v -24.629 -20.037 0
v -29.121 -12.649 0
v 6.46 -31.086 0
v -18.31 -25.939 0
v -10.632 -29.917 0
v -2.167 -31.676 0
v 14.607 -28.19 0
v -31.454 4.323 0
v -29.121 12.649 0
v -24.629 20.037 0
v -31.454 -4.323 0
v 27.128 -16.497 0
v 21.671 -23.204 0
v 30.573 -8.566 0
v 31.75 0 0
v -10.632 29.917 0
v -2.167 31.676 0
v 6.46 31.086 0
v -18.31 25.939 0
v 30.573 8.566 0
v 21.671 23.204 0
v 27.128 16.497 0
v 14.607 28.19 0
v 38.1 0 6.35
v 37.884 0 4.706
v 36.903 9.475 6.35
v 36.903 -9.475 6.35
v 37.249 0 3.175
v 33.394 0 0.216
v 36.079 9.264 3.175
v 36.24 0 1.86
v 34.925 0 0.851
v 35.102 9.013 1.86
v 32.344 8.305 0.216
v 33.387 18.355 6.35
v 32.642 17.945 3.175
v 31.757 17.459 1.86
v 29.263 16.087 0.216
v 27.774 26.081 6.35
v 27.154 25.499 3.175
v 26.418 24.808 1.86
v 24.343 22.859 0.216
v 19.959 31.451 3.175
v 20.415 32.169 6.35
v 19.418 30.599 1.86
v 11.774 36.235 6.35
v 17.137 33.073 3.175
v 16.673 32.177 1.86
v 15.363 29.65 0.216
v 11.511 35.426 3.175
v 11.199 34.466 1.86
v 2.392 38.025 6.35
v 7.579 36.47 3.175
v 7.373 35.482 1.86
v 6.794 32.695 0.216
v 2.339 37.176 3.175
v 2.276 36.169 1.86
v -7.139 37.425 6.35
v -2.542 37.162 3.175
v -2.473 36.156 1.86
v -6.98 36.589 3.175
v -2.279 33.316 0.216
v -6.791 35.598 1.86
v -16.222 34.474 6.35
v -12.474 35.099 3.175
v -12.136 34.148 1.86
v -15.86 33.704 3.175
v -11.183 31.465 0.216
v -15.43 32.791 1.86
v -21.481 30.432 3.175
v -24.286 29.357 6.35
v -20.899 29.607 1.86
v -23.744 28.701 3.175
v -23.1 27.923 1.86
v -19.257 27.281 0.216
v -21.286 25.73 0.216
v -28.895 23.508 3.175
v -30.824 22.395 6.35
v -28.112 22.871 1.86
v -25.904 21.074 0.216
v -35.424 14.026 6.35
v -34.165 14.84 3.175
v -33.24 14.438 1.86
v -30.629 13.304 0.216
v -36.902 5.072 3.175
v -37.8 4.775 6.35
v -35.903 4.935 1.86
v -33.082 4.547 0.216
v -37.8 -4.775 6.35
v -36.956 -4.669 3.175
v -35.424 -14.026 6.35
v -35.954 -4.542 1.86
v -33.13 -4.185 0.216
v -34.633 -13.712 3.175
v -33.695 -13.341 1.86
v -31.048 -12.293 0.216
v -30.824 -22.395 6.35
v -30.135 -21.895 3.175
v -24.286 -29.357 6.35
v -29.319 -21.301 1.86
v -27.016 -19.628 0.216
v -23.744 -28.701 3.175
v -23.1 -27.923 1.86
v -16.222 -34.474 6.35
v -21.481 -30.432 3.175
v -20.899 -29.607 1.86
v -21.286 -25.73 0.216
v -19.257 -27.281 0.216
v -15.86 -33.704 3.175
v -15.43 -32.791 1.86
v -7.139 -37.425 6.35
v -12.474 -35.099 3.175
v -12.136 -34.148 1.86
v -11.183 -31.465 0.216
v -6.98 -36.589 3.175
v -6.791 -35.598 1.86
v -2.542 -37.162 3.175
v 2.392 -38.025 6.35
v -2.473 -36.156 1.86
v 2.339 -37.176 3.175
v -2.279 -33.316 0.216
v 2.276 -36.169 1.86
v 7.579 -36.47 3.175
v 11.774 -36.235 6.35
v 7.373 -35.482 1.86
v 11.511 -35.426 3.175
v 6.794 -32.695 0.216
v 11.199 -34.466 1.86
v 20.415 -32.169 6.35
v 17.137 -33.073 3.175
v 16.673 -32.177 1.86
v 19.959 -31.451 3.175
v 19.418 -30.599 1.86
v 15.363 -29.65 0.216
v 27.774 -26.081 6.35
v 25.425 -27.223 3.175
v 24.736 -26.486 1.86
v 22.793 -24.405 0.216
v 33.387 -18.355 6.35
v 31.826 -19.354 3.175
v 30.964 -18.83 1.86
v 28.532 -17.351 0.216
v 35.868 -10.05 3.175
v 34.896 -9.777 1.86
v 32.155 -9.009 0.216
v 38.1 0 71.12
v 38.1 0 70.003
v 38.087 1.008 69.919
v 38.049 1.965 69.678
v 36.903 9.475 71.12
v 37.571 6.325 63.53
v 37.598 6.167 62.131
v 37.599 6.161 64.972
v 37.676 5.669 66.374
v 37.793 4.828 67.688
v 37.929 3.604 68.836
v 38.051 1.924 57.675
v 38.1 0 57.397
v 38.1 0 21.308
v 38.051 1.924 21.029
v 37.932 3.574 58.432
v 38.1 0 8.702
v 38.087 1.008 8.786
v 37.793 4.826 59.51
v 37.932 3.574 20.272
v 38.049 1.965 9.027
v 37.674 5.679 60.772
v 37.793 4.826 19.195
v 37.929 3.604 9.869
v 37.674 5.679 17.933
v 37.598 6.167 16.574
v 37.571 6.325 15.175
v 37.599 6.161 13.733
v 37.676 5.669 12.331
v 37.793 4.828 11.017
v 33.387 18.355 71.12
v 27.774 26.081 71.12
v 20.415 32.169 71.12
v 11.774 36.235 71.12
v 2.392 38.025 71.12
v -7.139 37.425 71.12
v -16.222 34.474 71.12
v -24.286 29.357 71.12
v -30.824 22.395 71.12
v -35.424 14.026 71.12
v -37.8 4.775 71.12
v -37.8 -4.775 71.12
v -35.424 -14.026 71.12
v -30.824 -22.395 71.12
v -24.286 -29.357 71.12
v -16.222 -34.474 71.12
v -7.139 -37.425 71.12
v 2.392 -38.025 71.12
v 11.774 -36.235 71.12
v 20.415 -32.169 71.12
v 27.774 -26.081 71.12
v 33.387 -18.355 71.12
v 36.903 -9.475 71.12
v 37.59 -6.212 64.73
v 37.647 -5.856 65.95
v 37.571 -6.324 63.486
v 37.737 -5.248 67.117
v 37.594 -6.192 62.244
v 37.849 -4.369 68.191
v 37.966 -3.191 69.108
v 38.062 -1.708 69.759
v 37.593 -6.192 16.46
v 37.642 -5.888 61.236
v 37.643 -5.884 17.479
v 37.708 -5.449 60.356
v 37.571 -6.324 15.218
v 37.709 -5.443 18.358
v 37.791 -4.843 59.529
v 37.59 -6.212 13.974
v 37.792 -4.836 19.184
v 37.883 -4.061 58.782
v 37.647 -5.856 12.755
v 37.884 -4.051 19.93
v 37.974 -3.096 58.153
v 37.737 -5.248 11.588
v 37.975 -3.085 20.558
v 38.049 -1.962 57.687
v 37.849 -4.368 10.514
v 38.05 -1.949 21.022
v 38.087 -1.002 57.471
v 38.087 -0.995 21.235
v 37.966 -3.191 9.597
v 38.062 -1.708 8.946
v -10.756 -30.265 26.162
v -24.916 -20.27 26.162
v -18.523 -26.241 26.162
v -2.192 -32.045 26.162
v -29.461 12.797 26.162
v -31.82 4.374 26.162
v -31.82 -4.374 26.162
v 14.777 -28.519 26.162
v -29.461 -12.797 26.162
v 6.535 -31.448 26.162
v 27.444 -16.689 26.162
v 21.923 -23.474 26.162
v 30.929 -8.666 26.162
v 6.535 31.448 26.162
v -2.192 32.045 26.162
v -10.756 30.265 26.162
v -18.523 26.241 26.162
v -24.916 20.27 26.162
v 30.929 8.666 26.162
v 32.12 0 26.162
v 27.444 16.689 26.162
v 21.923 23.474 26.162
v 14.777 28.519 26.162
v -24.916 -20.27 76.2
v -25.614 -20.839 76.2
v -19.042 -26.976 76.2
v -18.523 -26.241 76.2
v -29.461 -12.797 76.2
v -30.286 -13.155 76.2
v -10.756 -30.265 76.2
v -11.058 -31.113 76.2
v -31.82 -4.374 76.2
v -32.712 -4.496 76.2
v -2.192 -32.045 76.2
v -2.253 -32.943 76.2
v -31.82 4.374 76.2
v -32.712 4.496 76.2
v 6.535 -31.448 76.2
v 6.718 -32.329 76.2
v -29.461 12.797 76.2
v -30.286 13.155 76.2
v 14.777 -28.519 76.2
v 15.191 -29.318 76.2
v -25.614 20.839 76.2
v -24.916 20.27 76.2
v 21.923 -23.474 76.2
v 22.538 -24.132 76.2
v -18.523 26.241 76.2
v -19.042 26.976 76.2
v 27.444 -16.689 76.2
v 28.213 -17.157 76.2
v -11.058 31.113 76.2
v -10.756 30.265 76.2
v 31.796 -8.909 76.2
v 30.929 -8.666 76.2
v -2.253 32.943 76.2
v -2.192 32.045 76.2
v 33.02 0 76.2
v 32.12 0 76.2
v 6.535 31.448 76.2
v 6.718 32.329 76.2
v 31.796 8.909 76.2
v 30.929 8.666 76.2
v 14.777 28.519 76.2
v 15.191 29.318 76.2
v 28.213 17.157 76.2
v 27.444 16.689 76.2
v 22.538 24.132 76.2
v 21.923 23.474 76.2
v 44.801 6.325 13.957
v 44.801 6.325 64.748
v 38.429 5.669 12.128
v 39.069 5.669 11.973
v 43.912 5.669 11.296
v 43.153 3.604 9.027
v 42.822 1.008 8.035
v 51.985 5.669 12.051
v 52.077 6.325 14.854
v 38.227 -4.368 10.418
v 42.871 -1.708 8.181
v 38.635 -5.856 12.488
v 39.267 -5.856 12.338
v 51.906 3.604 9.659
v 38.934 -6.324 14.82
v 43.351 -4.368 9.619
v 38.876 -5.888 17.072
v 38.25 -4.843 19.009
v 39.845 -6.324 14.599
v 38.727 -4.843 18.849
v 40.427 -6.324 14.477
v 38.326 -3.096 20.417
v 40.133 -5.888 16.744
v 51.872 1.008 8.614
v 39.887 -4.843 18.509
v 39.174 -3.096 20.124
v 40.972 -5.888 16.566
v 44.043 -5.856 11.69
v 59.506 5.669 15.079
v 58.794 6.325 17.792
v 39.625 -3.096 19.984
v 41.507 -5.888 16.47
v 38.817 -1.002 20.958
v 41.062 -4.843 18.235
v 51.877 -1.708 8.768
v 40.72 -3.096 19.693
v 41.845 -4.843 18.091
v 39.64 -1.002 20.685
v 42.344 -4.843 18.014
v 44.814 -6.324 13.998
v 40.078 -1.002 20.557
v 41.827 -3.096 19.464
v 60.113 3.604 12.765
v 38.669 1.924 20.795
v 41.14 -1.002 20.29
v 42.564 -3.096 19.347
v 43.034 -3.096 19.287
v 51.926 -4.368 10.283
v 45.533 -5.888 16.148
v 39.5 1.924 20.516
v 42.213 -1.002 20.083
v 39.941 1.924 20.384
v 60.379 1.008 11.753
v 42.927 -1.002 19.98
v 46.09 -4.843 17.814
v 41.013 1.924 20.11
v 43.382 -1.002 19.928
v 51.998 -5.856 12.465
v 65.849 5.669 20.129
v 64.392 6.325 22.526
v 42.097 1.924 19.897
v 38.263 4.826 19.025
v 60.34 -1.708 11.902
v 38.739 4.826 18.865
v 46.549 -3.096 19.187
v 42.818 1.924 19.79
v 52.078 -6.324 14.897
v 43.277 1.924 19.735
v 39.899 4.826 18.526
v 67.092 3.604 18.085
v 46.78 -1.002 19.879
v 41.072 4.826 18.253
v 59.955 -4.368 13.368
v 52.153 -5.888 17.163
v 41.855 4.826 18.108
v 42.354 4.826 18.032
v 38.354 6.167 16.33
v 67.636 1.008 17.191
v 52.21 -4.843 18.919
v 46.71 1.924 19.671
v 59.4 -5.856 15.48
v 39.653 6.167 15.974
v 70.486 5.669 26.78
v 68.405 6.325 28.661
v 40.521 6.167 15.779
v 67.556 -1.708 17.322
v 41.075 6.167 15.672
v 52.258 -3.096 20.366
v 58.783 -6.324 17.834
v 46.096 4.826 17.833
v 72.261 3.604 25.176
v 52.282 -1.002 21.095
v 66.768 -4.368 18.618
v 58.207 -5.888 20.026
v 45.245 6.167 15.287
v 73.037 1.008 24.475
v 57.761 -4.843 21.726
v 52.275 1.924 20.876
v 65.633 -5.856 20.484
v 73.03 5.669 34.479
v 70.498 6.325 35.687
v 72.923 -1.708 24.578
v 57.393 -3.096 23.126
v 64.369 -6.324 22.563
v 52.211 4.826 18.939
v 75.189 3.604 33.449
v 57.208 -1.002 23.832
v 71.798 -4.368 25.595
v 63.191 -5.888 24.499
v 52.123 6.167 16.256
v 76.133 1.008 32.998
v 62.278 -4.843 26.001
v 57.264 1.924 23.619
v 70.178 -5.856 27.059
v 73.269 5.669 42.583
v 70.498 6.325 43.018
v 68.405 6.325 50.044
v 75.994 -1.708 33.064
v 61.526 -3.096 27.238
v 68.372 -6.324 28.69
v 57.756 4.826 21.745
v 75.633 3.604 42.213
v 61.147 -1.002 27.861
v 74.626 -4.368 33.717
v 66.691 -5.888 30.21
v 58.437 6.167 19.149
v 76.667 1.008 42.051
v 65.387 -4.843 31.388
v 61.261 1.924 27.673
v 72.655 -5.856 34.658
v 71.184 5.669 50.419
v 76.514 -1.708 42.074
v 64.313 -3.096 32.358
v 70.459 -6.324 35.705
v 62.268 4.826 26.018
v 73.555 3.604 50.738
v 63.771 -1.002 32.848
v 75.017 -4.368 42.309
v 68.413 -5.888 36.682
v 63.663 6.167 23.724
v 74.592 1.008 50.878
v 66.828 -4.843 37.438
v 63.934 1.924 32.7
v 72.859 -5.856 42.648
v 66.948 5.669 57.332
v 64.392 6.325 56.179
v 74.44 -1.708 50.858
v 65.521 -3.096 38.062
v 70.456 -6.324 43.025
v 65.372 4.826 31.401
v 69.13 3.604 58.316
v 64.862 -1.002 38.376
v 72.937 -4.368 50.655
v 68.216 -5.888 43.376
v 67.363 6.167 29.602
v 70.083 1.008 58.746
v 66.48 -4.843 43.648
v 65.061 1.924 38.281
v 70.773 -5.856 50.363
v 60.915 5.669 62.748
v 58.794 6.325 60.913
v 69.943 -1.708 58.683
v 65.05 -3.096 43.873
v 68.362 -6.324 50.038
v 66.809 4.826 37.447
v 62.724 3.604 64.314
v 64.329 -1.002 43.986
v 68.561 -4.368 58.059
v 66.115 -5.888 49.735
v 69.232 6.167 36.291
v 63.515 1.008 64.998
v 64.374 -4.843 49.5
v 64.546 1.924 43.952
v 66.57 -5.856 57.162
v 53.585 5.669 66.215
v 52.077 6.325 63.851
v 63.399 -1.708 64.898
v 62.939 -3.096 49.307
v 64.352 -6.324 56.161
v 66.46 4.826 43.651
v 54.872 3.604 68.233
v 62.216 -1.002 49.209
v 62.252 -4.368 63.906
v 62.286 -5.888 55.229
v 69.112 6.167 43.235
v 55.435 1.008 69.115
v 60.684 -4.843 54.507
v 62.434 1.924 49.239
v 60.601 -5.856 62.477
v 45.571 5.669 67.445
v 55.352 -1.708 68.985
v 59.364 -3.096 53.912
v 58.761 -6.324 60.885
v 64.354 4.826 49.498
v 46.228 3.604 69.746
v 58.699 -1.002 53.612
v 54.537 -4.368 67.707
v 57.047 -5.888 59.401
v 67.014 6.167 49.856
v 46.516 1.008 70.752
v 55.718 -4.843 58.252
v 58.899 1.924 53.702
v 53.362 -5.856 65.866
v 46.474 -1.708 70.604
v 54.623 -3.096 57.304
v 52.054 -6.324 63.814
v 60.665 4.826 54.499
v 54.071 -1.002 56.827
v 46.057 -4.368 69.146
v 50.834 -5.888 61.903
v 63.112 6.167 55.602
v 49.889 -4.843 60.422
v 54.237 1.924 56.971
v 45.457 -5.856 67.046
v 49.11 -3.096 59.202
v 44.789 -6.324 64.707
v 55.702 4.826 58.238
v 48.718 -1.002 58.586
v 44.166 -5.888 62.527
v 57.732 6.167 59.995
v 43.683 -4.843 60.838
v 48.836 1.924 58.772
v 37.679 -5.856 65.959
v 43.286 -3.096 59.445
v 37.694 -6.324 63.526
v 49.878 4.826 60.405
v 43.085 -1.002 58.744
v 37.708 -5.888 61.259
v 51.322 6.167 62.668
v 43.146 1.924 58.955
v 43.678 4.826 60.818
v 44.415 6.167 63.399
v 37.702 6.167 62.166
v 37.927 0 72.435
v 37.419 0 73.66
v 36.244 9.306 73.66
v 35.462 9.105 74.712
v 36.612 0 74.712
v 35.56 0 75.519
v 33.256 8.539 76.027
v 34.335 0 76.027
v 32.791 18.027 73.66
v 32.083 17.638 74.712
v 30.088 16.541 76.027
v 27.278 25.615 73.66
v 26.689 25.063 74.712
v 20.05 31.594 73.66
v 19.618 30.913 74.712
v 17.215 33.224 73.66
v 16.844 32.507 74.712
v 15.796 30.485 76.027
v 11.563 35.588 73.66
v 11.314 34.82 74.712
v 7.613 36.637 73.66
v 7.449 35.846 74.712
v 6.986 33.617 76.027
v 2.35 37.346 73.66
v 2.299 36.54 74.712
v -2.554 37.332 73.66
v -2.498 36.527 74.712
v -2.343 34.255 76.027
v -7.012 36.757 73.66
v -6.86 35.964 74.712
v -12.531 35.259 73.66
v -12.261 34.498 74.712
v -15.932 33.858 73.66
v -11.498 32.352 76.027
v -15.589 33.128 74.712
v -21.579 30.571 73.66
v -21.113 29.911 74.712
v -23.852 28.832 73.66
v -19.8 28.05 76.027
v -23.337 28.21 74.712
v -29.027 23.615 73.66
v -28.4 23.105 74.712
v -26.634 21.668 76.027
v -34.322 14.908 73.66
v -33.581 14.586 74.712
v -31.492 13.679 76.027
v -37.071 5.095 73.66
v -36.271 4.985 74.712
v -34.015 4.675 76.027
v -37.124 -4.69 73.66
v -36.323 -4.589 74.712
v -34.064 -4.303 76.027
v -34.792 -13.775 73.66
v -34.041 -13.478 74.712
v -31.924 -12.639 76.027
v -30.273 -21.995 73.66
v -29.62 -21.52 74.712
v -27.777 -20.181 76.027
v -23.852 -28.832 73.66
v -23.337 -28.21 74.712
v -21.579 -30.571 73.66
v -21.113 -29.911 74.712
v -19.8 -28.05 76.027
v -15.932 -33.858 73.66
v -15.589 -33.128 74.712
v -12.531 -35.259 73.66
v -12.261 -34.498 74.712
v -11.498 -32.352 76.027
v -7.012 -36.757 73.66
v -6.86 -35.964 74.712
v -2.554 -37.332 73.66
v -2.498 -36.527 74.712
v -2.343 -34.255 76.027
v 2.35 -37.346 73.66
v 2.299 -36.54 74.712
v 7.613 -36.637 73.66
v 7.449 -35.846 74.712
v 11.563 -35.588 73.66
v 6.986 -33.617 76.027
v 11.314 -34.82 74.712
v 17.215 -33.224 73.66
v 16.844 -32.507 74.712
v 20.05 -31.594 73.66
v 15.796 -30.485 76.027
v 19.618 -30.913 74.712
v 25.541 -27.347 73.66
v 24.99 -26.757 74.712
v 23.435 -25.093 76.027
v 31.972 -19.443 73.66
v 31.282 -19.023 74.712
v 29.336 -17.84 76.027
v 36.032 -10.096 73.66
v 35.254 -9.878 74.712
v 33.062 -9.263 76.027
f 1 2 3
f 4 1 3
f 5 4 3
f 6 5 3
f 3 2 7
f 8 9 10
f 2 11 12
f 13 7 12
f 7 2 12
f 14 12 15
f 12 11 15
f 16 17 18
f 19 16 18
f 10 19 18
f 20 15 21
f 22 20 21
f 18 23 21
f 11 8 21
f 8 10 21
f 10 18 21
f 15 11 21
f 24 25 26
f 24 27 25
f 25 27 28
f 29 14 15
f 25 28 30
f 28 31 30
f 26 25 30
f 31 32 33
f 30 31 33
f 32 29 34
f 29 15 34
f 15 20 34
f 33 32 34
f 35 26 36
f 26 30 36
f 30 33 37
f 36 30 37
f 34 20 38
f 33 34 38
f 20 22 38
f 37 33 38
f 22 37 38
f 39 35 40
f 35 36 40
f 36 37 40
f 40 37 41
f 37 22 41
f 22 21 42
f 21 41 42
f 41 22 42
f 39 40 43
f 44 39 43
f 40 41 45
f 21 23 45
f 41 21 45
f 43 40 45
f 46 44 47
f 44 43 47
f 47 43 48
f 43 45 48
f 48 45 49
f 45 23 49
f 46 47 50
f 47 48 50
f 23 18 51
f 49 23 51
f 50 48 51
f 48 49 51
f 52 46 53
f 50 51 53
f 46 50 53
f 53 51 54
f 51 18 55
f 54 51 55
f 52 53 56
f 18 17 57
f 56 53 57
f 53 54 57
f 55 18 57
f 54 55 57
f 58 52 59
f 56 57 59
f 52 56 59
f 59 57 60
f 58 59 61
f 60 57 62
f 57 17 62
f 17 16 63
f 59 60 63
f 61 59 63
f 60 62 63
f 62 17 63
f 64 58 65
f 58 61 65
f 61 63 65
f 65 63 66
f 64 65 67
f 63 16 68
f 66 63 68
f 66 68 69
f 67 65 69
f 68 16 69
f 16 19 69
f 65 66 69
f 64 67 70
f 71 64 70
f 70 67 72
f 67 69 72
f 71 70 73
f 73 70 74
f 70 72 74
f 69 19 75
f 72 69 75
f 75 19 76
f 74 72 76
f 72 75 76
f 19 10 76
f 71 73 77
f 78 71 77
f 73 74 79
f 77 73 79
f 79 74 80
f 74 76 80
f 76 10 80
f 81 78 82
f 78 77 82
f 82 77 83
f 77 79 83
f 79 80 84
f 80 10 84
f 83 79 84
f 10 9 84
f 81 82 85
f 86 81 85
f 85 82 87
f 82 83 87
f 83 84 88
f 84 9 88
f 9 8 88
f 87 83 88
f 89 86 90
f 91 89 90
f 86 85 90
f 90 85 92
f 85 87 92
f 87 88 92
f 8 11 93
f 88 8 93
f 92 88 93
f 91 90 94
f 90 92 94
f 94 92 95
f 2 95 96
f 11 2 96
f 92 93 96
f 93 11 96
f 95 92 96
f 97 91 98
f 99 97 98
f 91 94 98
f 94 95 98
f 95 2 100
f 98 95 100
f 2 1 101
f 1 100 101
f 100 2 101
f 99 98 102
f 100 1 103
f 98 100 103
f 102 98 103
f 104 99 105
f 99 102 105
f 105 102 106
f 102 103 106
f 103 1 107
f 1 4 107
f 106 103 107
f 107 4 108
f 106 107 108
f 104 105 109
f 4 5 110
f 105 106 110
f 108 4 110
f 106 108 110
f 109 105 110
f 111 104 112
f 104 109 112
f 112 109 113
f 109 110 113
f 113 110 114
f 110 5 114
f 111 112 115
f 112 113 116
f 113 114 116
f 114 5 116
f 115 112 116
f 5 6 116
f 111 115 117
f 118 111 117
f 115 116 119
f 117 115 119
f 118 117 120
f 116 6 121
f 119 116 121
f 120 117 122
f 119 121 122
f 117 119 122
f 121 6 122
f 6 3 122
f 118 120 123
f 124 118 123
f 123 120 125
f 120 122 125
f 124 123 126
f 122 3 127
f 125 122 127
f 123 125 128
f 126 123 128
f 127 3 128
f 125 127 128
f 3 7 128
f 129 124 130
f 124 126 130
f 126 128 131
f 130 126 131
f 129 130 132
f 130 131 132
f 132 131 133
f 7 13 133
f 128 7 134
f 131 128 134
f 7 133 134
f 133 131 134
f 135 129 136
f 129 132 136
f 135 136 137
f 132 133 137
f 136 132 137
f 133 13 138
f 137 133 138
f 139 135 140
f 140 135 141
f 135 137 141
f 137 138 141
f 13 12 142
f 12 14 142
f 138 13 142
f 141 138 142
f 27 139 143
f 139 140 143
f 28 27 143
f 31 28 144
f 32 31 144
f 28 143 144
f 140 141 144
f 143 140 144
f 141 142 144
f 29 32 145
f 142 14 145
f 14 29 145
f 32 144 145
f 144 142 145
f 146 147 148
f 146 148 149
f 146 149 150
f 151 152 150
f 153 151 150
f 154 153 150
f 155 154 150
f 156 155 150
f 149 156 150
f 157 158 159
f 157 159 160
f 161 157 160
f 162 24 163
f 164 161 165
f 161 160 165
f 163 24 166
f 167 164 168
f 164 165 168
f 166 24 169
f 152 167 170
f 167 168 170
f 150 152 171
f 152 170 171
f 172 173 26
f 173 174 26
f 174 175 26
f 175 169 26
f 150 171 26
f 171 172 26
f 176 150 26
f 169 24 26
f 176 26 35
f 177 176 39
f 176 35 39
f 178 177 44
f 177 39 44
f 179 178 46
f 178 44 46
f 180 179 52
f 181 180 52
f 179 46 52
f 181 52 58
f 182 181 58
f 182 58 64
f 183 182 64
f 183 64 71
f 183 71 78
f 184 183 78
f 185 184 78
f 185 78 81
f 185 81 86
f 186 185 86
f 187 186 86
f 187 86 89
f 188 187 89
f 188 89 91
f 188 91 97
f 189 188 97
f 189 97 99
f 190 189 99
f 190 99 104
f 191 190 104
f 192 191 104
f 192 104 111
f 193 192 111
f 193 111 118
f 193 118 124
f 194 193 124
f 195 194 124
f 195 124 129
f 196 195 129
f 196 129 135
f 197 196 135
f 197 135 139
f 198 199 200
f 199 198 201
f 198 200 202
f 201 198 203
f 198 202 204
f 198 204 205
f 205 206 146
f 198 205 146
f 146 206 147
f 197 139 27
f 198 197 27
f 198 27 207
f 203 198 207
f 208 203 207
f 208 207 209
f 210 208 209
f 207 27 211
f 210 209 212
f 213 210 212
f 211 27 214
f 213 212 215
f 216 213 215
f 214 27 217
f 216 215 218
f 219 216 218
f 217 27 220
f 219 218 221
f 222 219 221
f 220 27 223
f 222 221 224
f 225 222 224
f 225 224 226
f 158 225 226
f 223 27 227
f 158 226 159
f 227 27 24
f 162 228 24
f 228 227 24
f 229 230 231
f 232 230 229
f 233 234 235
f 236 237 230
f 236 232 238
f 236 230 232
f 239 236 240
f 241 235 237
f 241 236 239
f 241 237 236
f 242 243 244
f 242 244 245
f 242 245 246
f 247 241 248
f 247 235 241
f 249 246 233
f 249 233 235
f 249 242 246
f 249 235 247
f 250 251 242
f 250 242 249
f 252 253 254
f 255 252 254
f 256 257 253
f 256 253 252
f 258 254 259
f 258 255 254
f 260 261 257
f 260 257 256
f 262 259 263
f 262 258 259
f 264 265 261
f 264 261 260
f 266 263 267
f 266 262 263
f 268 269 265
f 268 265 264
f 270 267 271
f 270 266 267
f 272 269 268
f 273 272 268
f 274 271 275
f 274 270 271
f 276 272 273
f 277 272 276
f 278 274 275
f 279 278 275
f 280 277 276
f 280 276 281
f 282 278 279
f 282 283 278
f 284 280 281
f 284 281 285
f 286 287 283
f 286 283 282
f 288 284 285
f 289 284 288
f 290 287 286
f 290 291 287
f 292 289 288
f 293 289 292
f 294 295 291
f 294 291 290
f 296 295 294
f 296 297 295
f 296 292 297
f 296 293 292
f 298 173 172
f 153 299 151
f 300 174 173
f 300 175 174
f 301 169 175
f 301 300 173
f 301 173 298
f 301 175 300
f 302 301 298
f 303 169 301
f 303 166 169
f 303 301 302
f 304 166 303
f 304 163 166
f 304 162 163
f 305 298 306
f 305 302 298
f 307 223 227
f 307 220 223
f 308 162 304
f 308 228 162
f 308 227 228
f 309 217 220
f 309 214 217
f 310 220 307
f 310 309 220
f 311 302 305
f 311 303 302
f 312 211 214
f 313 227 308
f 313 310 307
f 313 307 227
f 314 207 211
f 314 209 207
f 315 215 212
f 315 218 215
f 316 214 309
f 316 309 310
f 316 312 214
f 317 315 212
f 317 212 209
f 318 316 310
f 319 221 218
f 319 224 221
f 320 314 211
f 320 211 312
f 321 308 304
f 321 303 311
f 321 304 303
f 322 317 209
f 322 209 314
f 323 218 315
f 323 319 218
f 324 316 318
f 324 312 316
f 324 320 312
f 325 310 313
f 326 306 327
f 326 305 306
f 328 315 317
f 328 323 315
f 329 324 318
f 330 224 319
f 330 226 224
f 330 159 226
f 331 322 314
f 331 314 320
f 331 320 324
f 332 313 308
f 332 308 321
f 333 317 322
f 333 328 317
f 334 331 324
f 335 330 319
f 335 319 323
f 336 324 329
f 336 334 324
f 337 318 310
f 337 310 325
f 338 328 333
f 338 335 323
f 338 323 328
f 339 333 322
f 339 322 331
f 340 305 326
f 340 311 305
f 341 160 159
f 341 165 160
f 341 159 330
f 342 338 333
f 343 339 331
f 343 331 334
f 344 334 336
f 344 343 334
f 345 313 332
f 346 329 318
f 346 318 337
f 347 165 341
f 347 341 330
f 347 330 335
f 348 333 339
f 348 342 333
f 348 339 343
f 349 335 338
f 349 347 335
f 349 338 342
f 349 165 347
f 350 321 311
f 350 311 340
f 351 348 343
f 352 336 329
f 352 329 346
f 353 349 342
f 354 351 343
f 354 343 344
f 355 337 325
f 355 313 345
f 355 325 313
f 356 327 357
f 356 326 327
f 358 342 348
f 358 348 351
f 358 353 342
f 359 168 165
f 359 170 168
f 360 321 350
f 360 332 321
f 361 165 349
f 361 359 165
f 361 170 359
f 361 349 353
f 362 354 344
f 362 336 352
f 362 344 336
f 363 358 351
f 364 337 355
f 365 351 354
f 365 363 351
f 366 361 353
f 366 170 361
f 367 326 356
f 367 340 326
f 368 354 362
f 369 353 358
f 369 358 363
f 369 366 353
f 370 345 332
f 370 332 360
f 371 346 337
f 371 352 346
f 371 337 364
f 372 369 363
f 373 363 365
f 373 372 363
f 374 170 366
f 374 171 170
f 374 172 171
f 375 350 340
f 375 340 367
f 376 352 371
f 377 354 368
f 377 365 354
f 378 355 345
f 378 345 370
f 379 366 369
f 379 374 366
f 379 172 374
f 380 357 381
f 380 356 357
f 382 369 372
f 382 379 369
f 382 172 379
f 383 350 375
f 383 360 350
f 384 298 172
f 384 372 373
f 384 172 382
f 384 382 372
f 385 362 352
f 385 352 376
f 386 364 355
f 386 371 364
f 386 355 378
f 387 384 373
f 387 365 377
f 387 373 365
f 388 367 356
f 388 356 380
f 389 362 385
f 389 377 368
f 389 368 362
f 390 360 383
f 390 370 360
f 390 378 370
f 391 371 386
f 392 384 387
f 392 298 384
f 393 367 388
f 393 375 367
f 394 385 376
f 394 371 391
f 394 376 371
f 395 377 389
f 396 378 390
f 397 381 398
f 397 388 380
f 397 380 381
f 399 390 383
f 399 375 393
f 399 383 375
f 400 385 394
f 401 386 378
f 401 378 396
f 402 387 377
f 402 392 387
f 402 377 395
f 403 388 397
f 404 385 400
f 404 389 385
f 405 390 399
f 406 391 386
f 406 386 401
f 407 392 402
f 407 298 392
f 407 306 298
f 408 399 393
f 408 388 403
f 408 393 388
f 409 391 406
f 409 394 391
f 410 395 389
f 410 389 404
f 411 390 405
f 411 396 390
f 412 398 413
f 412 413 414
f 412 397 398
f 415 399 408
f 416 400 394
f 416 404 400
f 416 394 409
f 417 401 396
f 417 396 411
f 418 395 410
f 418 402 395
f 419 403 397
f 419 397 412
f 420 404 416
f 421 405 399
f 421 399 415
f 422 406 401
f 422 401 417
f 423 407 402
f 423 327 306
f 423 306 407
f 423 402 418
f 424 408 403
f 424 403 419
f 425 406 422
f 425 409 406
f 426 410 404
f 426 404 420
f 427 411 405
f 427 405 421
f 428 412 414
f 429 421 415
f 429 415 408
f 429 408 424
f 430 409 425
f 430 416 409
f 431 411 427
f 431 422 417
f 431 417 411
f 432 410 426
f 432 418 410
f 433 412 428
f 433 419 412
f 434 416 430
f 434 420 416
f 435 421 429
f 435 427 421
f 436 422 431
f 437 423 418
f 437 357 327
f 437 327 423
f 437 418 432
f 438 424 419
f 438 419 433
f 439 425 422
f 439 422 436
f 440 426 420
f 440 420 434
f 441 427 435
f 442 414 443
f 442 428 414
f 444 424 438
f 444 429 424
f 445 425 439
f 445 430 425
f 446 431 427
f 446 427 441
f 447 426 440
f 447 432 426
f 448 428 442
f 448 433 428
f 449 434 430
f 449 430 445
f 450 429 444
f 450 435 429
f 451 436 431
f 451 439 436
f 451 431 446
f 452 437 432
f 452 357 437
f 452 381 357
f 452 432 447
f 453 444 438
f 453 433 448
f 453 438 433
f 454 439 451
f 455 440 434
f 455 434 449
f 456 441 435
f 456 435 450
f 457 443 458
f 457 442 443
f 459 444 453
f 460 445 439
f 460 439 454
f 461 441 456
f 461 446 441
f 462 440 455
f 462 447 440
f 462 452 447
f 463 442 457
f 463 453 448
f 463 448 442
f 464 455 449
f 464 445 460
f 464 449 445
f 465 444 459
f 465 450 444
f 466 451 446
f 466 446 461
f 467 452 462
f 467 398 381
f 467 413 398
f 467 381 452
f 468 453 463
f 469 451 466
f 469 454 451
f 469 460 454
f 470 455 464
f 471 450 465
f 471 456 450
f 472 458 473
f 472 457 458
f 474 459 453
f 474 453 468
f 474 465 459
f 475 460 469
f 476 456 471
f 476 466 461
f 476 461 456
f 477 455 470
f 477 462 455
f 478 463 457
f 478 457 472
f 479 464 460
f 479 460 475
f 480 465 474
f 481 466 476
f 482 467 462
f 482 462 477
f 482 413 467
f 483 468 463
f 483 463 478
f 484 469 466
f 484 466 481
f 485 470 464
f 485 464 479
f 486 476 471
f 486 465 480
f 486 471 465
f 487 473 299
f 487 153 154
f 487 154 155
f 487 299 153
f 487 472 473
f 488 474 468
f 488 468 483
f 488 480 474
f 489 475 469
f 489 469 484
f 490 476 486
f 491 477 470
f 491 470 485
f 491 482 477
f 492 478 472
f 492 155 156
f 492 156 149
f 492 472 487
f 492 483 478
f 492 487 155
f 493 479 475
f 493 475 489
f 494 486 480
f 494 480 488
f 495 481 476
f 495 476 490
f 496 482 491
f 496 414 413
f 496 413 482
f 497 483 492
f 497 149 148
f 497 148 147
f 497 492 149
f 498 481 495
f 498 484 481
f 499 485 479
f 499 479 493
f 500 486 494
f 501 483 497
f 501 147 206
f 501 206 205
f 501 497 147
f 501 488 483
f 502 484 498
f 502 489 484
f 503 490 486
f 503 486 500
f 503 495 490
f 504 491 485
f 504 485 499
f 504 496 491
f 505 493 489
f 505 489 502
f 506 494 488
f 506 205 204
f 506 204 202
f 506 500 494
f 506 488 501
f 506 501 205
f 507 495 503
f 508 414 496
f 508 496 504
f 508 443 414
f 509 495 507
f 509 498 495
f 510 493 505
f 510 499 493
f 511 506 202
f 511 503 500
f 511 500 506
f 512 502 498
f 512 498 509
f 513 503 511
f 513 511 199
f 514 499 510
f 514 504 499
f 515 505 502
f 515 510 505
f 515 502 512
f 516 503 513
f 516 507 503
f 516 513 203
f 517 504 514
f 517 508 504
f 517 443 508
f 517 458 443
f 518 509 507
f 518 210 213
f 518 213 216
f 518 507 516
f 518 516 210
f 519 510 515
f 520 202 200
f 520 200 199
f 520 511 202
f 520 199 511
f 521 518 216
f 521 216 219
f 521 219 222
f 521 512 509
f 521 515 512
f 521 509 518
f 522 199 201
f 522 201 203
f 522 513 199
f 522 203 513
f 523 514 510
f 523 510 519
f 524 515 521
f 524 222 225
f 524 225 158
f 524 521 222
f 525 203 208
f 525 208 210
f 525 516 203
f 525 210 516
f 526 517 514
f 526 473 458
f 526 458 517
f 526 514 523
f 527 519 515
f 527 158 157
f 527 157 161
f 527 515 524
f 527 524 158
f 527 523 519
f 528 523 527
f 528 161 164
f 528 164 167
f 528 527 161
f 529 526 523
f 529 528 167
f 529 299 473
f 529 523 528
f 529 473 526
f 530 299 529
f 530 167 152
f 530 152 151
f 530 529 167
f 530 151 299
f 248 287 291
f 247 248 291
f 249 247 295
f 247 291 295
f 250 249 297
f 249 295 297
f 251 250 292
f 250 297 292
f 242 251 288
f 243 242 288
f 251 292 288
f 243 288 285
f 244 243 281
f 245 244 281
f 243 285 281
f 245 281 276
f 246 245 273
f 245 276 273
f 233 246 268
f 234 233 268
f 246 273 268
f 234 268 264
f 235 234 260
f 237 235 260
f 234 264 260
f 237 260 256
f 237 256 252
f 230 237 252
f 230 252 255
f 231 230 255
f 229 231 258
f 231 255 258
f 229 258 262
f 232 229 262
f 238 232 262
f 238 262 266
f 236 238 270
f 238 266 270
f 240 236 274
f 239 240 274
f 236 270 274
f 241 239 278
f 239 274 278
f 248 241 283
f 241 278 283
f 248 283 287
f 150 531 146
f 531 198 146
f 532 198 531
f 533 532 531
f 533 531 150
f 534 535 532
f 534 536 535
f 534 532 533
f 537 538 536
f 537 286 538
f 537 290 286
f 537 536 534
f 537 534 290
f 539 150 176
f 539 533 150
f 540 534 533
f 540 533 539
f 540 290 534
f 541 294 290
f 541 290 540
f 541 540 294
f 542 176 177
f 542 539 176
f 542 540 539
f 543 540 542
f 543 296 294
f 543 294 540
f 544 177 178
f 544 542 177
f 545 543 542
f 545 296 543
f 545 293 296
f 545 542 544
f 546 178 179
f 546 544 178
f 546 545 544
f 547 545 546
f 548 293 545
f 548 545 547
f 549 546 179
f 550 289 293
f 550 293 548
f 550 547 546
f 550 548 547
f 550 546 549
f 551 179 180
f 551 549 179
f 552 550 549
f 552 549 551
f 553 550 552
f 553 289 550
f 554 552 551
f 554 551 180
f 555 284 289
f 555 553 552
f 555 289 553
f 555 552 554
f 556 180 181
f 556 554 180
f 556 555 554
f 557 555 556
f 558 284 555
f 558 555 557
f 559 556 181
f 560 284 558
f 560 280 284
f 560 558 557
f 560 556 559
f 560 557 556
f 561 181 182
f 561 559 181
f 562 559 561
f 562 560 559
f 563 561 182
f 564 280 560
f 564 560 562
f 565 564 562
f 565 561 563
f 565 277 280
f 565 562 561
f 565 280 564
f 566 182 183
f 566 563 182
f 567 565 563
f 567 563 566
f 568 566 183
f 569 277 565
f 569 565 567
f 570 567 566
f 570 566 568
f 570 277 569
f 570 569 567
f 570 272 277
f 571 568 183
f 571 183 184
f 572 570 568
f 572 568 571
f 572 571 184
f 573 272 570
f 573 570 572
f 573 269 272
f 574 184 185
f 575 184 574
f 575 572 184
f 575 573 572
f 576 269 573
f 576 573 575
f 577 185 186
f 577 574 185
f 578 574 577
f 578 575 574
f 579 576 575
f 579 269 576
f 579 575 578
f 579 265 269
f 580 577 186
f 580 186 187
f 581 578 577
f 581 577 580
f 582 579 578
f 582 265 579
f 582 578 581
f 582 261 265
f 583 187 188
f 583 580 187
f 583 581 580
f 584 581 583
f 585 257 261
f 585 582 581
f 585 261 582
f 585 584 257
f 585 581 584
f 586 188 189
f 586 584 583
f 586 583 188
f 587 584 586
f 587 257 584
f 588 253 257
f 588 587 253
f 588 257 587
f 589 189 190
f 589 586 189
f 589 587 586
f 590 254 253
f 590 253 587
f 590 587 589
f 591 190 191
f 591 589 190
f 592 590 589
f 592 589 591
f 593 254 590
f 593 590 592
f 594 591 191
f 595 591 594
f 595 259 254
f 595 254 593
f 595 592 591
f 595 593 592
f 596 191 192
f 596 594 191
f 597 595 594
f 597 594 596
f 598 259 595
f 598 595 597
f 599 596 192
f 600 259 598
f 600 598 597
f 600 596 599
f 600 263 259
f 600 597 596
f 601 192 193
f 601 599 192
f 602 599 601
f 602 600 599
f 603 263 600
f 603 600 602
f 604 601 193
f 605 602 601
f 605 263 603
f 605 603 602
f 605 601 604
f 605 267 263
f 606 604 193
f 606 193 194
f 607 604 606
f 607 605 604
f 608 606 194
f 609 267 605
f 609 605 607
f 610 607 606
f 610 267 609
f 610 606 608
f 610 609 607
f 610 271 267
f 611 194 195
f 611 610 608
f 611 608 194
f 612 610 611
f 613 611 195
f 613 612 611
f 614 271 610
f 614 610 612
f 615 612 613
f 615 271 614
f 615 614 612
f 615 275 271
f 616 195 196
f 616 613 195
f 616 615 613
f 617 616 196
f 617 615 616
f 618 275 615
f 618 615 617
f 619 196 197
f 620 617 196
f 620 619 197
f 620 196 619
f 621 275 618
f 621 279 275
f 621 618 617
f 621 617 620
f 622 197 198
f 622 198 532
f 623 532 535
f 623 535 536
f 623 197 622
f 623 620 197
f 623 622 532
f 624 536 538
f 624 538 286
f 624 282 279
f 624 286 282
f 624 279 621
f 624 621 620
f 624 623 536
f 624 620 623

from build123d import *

# Parameters (mm, degrees)
F0_R     = 38.1
F1_DEPTH = 76.2
F4_R     = 6.3246
F6_R     = 32.1196500774
F7_DEPTH = 50.038
F8_R     = 5.08
F9_R     = 6.35


with BuildPart() as f1:
    # F0 (on Top) → F1 (new body)
    with BuildSketch(Plane.XY):
        Circle(F0_R)
    extrude(amount=F1_DEPTH)

    # F5: sweep along a path in F2
    with BuildLine(Plane.XZ) as f5_path:
        ThreePointArc((33.5242934525, 16.8796218932), (70.7589105159, 39.7583444109), (32.8120825502, 61.4353114321))
    # F4 (on offset) → F5 (sweep)
    with BuildSketch(Plane.YZ.offset(37.846)):
        with Locations((0, 63.6169761419)):
            Circle(F4_R)
    sweep(path=f5_path.line)

    # F6 (on face) → F7 (cut)
    with BuildSketch(Plane.XY.offset(76.2)):
        Circle(F6_R)
    extrude(amount=-F7_DEPTH, mode=Mode.SUBTRACT)

    # F8
    f8_edges = [f1.edges().sort_by_distance(p)[0] for p in [
        (-38.1, 0, 76.2),
    ]]
    fillet(f8_edges, radius=F8_R)

    # F9
    f9_edges = [f1.edges().sort_by_distance(p)[0] for p in [
        (-38.1, 0, 0),
    ]]
    fillet(f9_edges, radius=F9_R)


solid = f1.part
